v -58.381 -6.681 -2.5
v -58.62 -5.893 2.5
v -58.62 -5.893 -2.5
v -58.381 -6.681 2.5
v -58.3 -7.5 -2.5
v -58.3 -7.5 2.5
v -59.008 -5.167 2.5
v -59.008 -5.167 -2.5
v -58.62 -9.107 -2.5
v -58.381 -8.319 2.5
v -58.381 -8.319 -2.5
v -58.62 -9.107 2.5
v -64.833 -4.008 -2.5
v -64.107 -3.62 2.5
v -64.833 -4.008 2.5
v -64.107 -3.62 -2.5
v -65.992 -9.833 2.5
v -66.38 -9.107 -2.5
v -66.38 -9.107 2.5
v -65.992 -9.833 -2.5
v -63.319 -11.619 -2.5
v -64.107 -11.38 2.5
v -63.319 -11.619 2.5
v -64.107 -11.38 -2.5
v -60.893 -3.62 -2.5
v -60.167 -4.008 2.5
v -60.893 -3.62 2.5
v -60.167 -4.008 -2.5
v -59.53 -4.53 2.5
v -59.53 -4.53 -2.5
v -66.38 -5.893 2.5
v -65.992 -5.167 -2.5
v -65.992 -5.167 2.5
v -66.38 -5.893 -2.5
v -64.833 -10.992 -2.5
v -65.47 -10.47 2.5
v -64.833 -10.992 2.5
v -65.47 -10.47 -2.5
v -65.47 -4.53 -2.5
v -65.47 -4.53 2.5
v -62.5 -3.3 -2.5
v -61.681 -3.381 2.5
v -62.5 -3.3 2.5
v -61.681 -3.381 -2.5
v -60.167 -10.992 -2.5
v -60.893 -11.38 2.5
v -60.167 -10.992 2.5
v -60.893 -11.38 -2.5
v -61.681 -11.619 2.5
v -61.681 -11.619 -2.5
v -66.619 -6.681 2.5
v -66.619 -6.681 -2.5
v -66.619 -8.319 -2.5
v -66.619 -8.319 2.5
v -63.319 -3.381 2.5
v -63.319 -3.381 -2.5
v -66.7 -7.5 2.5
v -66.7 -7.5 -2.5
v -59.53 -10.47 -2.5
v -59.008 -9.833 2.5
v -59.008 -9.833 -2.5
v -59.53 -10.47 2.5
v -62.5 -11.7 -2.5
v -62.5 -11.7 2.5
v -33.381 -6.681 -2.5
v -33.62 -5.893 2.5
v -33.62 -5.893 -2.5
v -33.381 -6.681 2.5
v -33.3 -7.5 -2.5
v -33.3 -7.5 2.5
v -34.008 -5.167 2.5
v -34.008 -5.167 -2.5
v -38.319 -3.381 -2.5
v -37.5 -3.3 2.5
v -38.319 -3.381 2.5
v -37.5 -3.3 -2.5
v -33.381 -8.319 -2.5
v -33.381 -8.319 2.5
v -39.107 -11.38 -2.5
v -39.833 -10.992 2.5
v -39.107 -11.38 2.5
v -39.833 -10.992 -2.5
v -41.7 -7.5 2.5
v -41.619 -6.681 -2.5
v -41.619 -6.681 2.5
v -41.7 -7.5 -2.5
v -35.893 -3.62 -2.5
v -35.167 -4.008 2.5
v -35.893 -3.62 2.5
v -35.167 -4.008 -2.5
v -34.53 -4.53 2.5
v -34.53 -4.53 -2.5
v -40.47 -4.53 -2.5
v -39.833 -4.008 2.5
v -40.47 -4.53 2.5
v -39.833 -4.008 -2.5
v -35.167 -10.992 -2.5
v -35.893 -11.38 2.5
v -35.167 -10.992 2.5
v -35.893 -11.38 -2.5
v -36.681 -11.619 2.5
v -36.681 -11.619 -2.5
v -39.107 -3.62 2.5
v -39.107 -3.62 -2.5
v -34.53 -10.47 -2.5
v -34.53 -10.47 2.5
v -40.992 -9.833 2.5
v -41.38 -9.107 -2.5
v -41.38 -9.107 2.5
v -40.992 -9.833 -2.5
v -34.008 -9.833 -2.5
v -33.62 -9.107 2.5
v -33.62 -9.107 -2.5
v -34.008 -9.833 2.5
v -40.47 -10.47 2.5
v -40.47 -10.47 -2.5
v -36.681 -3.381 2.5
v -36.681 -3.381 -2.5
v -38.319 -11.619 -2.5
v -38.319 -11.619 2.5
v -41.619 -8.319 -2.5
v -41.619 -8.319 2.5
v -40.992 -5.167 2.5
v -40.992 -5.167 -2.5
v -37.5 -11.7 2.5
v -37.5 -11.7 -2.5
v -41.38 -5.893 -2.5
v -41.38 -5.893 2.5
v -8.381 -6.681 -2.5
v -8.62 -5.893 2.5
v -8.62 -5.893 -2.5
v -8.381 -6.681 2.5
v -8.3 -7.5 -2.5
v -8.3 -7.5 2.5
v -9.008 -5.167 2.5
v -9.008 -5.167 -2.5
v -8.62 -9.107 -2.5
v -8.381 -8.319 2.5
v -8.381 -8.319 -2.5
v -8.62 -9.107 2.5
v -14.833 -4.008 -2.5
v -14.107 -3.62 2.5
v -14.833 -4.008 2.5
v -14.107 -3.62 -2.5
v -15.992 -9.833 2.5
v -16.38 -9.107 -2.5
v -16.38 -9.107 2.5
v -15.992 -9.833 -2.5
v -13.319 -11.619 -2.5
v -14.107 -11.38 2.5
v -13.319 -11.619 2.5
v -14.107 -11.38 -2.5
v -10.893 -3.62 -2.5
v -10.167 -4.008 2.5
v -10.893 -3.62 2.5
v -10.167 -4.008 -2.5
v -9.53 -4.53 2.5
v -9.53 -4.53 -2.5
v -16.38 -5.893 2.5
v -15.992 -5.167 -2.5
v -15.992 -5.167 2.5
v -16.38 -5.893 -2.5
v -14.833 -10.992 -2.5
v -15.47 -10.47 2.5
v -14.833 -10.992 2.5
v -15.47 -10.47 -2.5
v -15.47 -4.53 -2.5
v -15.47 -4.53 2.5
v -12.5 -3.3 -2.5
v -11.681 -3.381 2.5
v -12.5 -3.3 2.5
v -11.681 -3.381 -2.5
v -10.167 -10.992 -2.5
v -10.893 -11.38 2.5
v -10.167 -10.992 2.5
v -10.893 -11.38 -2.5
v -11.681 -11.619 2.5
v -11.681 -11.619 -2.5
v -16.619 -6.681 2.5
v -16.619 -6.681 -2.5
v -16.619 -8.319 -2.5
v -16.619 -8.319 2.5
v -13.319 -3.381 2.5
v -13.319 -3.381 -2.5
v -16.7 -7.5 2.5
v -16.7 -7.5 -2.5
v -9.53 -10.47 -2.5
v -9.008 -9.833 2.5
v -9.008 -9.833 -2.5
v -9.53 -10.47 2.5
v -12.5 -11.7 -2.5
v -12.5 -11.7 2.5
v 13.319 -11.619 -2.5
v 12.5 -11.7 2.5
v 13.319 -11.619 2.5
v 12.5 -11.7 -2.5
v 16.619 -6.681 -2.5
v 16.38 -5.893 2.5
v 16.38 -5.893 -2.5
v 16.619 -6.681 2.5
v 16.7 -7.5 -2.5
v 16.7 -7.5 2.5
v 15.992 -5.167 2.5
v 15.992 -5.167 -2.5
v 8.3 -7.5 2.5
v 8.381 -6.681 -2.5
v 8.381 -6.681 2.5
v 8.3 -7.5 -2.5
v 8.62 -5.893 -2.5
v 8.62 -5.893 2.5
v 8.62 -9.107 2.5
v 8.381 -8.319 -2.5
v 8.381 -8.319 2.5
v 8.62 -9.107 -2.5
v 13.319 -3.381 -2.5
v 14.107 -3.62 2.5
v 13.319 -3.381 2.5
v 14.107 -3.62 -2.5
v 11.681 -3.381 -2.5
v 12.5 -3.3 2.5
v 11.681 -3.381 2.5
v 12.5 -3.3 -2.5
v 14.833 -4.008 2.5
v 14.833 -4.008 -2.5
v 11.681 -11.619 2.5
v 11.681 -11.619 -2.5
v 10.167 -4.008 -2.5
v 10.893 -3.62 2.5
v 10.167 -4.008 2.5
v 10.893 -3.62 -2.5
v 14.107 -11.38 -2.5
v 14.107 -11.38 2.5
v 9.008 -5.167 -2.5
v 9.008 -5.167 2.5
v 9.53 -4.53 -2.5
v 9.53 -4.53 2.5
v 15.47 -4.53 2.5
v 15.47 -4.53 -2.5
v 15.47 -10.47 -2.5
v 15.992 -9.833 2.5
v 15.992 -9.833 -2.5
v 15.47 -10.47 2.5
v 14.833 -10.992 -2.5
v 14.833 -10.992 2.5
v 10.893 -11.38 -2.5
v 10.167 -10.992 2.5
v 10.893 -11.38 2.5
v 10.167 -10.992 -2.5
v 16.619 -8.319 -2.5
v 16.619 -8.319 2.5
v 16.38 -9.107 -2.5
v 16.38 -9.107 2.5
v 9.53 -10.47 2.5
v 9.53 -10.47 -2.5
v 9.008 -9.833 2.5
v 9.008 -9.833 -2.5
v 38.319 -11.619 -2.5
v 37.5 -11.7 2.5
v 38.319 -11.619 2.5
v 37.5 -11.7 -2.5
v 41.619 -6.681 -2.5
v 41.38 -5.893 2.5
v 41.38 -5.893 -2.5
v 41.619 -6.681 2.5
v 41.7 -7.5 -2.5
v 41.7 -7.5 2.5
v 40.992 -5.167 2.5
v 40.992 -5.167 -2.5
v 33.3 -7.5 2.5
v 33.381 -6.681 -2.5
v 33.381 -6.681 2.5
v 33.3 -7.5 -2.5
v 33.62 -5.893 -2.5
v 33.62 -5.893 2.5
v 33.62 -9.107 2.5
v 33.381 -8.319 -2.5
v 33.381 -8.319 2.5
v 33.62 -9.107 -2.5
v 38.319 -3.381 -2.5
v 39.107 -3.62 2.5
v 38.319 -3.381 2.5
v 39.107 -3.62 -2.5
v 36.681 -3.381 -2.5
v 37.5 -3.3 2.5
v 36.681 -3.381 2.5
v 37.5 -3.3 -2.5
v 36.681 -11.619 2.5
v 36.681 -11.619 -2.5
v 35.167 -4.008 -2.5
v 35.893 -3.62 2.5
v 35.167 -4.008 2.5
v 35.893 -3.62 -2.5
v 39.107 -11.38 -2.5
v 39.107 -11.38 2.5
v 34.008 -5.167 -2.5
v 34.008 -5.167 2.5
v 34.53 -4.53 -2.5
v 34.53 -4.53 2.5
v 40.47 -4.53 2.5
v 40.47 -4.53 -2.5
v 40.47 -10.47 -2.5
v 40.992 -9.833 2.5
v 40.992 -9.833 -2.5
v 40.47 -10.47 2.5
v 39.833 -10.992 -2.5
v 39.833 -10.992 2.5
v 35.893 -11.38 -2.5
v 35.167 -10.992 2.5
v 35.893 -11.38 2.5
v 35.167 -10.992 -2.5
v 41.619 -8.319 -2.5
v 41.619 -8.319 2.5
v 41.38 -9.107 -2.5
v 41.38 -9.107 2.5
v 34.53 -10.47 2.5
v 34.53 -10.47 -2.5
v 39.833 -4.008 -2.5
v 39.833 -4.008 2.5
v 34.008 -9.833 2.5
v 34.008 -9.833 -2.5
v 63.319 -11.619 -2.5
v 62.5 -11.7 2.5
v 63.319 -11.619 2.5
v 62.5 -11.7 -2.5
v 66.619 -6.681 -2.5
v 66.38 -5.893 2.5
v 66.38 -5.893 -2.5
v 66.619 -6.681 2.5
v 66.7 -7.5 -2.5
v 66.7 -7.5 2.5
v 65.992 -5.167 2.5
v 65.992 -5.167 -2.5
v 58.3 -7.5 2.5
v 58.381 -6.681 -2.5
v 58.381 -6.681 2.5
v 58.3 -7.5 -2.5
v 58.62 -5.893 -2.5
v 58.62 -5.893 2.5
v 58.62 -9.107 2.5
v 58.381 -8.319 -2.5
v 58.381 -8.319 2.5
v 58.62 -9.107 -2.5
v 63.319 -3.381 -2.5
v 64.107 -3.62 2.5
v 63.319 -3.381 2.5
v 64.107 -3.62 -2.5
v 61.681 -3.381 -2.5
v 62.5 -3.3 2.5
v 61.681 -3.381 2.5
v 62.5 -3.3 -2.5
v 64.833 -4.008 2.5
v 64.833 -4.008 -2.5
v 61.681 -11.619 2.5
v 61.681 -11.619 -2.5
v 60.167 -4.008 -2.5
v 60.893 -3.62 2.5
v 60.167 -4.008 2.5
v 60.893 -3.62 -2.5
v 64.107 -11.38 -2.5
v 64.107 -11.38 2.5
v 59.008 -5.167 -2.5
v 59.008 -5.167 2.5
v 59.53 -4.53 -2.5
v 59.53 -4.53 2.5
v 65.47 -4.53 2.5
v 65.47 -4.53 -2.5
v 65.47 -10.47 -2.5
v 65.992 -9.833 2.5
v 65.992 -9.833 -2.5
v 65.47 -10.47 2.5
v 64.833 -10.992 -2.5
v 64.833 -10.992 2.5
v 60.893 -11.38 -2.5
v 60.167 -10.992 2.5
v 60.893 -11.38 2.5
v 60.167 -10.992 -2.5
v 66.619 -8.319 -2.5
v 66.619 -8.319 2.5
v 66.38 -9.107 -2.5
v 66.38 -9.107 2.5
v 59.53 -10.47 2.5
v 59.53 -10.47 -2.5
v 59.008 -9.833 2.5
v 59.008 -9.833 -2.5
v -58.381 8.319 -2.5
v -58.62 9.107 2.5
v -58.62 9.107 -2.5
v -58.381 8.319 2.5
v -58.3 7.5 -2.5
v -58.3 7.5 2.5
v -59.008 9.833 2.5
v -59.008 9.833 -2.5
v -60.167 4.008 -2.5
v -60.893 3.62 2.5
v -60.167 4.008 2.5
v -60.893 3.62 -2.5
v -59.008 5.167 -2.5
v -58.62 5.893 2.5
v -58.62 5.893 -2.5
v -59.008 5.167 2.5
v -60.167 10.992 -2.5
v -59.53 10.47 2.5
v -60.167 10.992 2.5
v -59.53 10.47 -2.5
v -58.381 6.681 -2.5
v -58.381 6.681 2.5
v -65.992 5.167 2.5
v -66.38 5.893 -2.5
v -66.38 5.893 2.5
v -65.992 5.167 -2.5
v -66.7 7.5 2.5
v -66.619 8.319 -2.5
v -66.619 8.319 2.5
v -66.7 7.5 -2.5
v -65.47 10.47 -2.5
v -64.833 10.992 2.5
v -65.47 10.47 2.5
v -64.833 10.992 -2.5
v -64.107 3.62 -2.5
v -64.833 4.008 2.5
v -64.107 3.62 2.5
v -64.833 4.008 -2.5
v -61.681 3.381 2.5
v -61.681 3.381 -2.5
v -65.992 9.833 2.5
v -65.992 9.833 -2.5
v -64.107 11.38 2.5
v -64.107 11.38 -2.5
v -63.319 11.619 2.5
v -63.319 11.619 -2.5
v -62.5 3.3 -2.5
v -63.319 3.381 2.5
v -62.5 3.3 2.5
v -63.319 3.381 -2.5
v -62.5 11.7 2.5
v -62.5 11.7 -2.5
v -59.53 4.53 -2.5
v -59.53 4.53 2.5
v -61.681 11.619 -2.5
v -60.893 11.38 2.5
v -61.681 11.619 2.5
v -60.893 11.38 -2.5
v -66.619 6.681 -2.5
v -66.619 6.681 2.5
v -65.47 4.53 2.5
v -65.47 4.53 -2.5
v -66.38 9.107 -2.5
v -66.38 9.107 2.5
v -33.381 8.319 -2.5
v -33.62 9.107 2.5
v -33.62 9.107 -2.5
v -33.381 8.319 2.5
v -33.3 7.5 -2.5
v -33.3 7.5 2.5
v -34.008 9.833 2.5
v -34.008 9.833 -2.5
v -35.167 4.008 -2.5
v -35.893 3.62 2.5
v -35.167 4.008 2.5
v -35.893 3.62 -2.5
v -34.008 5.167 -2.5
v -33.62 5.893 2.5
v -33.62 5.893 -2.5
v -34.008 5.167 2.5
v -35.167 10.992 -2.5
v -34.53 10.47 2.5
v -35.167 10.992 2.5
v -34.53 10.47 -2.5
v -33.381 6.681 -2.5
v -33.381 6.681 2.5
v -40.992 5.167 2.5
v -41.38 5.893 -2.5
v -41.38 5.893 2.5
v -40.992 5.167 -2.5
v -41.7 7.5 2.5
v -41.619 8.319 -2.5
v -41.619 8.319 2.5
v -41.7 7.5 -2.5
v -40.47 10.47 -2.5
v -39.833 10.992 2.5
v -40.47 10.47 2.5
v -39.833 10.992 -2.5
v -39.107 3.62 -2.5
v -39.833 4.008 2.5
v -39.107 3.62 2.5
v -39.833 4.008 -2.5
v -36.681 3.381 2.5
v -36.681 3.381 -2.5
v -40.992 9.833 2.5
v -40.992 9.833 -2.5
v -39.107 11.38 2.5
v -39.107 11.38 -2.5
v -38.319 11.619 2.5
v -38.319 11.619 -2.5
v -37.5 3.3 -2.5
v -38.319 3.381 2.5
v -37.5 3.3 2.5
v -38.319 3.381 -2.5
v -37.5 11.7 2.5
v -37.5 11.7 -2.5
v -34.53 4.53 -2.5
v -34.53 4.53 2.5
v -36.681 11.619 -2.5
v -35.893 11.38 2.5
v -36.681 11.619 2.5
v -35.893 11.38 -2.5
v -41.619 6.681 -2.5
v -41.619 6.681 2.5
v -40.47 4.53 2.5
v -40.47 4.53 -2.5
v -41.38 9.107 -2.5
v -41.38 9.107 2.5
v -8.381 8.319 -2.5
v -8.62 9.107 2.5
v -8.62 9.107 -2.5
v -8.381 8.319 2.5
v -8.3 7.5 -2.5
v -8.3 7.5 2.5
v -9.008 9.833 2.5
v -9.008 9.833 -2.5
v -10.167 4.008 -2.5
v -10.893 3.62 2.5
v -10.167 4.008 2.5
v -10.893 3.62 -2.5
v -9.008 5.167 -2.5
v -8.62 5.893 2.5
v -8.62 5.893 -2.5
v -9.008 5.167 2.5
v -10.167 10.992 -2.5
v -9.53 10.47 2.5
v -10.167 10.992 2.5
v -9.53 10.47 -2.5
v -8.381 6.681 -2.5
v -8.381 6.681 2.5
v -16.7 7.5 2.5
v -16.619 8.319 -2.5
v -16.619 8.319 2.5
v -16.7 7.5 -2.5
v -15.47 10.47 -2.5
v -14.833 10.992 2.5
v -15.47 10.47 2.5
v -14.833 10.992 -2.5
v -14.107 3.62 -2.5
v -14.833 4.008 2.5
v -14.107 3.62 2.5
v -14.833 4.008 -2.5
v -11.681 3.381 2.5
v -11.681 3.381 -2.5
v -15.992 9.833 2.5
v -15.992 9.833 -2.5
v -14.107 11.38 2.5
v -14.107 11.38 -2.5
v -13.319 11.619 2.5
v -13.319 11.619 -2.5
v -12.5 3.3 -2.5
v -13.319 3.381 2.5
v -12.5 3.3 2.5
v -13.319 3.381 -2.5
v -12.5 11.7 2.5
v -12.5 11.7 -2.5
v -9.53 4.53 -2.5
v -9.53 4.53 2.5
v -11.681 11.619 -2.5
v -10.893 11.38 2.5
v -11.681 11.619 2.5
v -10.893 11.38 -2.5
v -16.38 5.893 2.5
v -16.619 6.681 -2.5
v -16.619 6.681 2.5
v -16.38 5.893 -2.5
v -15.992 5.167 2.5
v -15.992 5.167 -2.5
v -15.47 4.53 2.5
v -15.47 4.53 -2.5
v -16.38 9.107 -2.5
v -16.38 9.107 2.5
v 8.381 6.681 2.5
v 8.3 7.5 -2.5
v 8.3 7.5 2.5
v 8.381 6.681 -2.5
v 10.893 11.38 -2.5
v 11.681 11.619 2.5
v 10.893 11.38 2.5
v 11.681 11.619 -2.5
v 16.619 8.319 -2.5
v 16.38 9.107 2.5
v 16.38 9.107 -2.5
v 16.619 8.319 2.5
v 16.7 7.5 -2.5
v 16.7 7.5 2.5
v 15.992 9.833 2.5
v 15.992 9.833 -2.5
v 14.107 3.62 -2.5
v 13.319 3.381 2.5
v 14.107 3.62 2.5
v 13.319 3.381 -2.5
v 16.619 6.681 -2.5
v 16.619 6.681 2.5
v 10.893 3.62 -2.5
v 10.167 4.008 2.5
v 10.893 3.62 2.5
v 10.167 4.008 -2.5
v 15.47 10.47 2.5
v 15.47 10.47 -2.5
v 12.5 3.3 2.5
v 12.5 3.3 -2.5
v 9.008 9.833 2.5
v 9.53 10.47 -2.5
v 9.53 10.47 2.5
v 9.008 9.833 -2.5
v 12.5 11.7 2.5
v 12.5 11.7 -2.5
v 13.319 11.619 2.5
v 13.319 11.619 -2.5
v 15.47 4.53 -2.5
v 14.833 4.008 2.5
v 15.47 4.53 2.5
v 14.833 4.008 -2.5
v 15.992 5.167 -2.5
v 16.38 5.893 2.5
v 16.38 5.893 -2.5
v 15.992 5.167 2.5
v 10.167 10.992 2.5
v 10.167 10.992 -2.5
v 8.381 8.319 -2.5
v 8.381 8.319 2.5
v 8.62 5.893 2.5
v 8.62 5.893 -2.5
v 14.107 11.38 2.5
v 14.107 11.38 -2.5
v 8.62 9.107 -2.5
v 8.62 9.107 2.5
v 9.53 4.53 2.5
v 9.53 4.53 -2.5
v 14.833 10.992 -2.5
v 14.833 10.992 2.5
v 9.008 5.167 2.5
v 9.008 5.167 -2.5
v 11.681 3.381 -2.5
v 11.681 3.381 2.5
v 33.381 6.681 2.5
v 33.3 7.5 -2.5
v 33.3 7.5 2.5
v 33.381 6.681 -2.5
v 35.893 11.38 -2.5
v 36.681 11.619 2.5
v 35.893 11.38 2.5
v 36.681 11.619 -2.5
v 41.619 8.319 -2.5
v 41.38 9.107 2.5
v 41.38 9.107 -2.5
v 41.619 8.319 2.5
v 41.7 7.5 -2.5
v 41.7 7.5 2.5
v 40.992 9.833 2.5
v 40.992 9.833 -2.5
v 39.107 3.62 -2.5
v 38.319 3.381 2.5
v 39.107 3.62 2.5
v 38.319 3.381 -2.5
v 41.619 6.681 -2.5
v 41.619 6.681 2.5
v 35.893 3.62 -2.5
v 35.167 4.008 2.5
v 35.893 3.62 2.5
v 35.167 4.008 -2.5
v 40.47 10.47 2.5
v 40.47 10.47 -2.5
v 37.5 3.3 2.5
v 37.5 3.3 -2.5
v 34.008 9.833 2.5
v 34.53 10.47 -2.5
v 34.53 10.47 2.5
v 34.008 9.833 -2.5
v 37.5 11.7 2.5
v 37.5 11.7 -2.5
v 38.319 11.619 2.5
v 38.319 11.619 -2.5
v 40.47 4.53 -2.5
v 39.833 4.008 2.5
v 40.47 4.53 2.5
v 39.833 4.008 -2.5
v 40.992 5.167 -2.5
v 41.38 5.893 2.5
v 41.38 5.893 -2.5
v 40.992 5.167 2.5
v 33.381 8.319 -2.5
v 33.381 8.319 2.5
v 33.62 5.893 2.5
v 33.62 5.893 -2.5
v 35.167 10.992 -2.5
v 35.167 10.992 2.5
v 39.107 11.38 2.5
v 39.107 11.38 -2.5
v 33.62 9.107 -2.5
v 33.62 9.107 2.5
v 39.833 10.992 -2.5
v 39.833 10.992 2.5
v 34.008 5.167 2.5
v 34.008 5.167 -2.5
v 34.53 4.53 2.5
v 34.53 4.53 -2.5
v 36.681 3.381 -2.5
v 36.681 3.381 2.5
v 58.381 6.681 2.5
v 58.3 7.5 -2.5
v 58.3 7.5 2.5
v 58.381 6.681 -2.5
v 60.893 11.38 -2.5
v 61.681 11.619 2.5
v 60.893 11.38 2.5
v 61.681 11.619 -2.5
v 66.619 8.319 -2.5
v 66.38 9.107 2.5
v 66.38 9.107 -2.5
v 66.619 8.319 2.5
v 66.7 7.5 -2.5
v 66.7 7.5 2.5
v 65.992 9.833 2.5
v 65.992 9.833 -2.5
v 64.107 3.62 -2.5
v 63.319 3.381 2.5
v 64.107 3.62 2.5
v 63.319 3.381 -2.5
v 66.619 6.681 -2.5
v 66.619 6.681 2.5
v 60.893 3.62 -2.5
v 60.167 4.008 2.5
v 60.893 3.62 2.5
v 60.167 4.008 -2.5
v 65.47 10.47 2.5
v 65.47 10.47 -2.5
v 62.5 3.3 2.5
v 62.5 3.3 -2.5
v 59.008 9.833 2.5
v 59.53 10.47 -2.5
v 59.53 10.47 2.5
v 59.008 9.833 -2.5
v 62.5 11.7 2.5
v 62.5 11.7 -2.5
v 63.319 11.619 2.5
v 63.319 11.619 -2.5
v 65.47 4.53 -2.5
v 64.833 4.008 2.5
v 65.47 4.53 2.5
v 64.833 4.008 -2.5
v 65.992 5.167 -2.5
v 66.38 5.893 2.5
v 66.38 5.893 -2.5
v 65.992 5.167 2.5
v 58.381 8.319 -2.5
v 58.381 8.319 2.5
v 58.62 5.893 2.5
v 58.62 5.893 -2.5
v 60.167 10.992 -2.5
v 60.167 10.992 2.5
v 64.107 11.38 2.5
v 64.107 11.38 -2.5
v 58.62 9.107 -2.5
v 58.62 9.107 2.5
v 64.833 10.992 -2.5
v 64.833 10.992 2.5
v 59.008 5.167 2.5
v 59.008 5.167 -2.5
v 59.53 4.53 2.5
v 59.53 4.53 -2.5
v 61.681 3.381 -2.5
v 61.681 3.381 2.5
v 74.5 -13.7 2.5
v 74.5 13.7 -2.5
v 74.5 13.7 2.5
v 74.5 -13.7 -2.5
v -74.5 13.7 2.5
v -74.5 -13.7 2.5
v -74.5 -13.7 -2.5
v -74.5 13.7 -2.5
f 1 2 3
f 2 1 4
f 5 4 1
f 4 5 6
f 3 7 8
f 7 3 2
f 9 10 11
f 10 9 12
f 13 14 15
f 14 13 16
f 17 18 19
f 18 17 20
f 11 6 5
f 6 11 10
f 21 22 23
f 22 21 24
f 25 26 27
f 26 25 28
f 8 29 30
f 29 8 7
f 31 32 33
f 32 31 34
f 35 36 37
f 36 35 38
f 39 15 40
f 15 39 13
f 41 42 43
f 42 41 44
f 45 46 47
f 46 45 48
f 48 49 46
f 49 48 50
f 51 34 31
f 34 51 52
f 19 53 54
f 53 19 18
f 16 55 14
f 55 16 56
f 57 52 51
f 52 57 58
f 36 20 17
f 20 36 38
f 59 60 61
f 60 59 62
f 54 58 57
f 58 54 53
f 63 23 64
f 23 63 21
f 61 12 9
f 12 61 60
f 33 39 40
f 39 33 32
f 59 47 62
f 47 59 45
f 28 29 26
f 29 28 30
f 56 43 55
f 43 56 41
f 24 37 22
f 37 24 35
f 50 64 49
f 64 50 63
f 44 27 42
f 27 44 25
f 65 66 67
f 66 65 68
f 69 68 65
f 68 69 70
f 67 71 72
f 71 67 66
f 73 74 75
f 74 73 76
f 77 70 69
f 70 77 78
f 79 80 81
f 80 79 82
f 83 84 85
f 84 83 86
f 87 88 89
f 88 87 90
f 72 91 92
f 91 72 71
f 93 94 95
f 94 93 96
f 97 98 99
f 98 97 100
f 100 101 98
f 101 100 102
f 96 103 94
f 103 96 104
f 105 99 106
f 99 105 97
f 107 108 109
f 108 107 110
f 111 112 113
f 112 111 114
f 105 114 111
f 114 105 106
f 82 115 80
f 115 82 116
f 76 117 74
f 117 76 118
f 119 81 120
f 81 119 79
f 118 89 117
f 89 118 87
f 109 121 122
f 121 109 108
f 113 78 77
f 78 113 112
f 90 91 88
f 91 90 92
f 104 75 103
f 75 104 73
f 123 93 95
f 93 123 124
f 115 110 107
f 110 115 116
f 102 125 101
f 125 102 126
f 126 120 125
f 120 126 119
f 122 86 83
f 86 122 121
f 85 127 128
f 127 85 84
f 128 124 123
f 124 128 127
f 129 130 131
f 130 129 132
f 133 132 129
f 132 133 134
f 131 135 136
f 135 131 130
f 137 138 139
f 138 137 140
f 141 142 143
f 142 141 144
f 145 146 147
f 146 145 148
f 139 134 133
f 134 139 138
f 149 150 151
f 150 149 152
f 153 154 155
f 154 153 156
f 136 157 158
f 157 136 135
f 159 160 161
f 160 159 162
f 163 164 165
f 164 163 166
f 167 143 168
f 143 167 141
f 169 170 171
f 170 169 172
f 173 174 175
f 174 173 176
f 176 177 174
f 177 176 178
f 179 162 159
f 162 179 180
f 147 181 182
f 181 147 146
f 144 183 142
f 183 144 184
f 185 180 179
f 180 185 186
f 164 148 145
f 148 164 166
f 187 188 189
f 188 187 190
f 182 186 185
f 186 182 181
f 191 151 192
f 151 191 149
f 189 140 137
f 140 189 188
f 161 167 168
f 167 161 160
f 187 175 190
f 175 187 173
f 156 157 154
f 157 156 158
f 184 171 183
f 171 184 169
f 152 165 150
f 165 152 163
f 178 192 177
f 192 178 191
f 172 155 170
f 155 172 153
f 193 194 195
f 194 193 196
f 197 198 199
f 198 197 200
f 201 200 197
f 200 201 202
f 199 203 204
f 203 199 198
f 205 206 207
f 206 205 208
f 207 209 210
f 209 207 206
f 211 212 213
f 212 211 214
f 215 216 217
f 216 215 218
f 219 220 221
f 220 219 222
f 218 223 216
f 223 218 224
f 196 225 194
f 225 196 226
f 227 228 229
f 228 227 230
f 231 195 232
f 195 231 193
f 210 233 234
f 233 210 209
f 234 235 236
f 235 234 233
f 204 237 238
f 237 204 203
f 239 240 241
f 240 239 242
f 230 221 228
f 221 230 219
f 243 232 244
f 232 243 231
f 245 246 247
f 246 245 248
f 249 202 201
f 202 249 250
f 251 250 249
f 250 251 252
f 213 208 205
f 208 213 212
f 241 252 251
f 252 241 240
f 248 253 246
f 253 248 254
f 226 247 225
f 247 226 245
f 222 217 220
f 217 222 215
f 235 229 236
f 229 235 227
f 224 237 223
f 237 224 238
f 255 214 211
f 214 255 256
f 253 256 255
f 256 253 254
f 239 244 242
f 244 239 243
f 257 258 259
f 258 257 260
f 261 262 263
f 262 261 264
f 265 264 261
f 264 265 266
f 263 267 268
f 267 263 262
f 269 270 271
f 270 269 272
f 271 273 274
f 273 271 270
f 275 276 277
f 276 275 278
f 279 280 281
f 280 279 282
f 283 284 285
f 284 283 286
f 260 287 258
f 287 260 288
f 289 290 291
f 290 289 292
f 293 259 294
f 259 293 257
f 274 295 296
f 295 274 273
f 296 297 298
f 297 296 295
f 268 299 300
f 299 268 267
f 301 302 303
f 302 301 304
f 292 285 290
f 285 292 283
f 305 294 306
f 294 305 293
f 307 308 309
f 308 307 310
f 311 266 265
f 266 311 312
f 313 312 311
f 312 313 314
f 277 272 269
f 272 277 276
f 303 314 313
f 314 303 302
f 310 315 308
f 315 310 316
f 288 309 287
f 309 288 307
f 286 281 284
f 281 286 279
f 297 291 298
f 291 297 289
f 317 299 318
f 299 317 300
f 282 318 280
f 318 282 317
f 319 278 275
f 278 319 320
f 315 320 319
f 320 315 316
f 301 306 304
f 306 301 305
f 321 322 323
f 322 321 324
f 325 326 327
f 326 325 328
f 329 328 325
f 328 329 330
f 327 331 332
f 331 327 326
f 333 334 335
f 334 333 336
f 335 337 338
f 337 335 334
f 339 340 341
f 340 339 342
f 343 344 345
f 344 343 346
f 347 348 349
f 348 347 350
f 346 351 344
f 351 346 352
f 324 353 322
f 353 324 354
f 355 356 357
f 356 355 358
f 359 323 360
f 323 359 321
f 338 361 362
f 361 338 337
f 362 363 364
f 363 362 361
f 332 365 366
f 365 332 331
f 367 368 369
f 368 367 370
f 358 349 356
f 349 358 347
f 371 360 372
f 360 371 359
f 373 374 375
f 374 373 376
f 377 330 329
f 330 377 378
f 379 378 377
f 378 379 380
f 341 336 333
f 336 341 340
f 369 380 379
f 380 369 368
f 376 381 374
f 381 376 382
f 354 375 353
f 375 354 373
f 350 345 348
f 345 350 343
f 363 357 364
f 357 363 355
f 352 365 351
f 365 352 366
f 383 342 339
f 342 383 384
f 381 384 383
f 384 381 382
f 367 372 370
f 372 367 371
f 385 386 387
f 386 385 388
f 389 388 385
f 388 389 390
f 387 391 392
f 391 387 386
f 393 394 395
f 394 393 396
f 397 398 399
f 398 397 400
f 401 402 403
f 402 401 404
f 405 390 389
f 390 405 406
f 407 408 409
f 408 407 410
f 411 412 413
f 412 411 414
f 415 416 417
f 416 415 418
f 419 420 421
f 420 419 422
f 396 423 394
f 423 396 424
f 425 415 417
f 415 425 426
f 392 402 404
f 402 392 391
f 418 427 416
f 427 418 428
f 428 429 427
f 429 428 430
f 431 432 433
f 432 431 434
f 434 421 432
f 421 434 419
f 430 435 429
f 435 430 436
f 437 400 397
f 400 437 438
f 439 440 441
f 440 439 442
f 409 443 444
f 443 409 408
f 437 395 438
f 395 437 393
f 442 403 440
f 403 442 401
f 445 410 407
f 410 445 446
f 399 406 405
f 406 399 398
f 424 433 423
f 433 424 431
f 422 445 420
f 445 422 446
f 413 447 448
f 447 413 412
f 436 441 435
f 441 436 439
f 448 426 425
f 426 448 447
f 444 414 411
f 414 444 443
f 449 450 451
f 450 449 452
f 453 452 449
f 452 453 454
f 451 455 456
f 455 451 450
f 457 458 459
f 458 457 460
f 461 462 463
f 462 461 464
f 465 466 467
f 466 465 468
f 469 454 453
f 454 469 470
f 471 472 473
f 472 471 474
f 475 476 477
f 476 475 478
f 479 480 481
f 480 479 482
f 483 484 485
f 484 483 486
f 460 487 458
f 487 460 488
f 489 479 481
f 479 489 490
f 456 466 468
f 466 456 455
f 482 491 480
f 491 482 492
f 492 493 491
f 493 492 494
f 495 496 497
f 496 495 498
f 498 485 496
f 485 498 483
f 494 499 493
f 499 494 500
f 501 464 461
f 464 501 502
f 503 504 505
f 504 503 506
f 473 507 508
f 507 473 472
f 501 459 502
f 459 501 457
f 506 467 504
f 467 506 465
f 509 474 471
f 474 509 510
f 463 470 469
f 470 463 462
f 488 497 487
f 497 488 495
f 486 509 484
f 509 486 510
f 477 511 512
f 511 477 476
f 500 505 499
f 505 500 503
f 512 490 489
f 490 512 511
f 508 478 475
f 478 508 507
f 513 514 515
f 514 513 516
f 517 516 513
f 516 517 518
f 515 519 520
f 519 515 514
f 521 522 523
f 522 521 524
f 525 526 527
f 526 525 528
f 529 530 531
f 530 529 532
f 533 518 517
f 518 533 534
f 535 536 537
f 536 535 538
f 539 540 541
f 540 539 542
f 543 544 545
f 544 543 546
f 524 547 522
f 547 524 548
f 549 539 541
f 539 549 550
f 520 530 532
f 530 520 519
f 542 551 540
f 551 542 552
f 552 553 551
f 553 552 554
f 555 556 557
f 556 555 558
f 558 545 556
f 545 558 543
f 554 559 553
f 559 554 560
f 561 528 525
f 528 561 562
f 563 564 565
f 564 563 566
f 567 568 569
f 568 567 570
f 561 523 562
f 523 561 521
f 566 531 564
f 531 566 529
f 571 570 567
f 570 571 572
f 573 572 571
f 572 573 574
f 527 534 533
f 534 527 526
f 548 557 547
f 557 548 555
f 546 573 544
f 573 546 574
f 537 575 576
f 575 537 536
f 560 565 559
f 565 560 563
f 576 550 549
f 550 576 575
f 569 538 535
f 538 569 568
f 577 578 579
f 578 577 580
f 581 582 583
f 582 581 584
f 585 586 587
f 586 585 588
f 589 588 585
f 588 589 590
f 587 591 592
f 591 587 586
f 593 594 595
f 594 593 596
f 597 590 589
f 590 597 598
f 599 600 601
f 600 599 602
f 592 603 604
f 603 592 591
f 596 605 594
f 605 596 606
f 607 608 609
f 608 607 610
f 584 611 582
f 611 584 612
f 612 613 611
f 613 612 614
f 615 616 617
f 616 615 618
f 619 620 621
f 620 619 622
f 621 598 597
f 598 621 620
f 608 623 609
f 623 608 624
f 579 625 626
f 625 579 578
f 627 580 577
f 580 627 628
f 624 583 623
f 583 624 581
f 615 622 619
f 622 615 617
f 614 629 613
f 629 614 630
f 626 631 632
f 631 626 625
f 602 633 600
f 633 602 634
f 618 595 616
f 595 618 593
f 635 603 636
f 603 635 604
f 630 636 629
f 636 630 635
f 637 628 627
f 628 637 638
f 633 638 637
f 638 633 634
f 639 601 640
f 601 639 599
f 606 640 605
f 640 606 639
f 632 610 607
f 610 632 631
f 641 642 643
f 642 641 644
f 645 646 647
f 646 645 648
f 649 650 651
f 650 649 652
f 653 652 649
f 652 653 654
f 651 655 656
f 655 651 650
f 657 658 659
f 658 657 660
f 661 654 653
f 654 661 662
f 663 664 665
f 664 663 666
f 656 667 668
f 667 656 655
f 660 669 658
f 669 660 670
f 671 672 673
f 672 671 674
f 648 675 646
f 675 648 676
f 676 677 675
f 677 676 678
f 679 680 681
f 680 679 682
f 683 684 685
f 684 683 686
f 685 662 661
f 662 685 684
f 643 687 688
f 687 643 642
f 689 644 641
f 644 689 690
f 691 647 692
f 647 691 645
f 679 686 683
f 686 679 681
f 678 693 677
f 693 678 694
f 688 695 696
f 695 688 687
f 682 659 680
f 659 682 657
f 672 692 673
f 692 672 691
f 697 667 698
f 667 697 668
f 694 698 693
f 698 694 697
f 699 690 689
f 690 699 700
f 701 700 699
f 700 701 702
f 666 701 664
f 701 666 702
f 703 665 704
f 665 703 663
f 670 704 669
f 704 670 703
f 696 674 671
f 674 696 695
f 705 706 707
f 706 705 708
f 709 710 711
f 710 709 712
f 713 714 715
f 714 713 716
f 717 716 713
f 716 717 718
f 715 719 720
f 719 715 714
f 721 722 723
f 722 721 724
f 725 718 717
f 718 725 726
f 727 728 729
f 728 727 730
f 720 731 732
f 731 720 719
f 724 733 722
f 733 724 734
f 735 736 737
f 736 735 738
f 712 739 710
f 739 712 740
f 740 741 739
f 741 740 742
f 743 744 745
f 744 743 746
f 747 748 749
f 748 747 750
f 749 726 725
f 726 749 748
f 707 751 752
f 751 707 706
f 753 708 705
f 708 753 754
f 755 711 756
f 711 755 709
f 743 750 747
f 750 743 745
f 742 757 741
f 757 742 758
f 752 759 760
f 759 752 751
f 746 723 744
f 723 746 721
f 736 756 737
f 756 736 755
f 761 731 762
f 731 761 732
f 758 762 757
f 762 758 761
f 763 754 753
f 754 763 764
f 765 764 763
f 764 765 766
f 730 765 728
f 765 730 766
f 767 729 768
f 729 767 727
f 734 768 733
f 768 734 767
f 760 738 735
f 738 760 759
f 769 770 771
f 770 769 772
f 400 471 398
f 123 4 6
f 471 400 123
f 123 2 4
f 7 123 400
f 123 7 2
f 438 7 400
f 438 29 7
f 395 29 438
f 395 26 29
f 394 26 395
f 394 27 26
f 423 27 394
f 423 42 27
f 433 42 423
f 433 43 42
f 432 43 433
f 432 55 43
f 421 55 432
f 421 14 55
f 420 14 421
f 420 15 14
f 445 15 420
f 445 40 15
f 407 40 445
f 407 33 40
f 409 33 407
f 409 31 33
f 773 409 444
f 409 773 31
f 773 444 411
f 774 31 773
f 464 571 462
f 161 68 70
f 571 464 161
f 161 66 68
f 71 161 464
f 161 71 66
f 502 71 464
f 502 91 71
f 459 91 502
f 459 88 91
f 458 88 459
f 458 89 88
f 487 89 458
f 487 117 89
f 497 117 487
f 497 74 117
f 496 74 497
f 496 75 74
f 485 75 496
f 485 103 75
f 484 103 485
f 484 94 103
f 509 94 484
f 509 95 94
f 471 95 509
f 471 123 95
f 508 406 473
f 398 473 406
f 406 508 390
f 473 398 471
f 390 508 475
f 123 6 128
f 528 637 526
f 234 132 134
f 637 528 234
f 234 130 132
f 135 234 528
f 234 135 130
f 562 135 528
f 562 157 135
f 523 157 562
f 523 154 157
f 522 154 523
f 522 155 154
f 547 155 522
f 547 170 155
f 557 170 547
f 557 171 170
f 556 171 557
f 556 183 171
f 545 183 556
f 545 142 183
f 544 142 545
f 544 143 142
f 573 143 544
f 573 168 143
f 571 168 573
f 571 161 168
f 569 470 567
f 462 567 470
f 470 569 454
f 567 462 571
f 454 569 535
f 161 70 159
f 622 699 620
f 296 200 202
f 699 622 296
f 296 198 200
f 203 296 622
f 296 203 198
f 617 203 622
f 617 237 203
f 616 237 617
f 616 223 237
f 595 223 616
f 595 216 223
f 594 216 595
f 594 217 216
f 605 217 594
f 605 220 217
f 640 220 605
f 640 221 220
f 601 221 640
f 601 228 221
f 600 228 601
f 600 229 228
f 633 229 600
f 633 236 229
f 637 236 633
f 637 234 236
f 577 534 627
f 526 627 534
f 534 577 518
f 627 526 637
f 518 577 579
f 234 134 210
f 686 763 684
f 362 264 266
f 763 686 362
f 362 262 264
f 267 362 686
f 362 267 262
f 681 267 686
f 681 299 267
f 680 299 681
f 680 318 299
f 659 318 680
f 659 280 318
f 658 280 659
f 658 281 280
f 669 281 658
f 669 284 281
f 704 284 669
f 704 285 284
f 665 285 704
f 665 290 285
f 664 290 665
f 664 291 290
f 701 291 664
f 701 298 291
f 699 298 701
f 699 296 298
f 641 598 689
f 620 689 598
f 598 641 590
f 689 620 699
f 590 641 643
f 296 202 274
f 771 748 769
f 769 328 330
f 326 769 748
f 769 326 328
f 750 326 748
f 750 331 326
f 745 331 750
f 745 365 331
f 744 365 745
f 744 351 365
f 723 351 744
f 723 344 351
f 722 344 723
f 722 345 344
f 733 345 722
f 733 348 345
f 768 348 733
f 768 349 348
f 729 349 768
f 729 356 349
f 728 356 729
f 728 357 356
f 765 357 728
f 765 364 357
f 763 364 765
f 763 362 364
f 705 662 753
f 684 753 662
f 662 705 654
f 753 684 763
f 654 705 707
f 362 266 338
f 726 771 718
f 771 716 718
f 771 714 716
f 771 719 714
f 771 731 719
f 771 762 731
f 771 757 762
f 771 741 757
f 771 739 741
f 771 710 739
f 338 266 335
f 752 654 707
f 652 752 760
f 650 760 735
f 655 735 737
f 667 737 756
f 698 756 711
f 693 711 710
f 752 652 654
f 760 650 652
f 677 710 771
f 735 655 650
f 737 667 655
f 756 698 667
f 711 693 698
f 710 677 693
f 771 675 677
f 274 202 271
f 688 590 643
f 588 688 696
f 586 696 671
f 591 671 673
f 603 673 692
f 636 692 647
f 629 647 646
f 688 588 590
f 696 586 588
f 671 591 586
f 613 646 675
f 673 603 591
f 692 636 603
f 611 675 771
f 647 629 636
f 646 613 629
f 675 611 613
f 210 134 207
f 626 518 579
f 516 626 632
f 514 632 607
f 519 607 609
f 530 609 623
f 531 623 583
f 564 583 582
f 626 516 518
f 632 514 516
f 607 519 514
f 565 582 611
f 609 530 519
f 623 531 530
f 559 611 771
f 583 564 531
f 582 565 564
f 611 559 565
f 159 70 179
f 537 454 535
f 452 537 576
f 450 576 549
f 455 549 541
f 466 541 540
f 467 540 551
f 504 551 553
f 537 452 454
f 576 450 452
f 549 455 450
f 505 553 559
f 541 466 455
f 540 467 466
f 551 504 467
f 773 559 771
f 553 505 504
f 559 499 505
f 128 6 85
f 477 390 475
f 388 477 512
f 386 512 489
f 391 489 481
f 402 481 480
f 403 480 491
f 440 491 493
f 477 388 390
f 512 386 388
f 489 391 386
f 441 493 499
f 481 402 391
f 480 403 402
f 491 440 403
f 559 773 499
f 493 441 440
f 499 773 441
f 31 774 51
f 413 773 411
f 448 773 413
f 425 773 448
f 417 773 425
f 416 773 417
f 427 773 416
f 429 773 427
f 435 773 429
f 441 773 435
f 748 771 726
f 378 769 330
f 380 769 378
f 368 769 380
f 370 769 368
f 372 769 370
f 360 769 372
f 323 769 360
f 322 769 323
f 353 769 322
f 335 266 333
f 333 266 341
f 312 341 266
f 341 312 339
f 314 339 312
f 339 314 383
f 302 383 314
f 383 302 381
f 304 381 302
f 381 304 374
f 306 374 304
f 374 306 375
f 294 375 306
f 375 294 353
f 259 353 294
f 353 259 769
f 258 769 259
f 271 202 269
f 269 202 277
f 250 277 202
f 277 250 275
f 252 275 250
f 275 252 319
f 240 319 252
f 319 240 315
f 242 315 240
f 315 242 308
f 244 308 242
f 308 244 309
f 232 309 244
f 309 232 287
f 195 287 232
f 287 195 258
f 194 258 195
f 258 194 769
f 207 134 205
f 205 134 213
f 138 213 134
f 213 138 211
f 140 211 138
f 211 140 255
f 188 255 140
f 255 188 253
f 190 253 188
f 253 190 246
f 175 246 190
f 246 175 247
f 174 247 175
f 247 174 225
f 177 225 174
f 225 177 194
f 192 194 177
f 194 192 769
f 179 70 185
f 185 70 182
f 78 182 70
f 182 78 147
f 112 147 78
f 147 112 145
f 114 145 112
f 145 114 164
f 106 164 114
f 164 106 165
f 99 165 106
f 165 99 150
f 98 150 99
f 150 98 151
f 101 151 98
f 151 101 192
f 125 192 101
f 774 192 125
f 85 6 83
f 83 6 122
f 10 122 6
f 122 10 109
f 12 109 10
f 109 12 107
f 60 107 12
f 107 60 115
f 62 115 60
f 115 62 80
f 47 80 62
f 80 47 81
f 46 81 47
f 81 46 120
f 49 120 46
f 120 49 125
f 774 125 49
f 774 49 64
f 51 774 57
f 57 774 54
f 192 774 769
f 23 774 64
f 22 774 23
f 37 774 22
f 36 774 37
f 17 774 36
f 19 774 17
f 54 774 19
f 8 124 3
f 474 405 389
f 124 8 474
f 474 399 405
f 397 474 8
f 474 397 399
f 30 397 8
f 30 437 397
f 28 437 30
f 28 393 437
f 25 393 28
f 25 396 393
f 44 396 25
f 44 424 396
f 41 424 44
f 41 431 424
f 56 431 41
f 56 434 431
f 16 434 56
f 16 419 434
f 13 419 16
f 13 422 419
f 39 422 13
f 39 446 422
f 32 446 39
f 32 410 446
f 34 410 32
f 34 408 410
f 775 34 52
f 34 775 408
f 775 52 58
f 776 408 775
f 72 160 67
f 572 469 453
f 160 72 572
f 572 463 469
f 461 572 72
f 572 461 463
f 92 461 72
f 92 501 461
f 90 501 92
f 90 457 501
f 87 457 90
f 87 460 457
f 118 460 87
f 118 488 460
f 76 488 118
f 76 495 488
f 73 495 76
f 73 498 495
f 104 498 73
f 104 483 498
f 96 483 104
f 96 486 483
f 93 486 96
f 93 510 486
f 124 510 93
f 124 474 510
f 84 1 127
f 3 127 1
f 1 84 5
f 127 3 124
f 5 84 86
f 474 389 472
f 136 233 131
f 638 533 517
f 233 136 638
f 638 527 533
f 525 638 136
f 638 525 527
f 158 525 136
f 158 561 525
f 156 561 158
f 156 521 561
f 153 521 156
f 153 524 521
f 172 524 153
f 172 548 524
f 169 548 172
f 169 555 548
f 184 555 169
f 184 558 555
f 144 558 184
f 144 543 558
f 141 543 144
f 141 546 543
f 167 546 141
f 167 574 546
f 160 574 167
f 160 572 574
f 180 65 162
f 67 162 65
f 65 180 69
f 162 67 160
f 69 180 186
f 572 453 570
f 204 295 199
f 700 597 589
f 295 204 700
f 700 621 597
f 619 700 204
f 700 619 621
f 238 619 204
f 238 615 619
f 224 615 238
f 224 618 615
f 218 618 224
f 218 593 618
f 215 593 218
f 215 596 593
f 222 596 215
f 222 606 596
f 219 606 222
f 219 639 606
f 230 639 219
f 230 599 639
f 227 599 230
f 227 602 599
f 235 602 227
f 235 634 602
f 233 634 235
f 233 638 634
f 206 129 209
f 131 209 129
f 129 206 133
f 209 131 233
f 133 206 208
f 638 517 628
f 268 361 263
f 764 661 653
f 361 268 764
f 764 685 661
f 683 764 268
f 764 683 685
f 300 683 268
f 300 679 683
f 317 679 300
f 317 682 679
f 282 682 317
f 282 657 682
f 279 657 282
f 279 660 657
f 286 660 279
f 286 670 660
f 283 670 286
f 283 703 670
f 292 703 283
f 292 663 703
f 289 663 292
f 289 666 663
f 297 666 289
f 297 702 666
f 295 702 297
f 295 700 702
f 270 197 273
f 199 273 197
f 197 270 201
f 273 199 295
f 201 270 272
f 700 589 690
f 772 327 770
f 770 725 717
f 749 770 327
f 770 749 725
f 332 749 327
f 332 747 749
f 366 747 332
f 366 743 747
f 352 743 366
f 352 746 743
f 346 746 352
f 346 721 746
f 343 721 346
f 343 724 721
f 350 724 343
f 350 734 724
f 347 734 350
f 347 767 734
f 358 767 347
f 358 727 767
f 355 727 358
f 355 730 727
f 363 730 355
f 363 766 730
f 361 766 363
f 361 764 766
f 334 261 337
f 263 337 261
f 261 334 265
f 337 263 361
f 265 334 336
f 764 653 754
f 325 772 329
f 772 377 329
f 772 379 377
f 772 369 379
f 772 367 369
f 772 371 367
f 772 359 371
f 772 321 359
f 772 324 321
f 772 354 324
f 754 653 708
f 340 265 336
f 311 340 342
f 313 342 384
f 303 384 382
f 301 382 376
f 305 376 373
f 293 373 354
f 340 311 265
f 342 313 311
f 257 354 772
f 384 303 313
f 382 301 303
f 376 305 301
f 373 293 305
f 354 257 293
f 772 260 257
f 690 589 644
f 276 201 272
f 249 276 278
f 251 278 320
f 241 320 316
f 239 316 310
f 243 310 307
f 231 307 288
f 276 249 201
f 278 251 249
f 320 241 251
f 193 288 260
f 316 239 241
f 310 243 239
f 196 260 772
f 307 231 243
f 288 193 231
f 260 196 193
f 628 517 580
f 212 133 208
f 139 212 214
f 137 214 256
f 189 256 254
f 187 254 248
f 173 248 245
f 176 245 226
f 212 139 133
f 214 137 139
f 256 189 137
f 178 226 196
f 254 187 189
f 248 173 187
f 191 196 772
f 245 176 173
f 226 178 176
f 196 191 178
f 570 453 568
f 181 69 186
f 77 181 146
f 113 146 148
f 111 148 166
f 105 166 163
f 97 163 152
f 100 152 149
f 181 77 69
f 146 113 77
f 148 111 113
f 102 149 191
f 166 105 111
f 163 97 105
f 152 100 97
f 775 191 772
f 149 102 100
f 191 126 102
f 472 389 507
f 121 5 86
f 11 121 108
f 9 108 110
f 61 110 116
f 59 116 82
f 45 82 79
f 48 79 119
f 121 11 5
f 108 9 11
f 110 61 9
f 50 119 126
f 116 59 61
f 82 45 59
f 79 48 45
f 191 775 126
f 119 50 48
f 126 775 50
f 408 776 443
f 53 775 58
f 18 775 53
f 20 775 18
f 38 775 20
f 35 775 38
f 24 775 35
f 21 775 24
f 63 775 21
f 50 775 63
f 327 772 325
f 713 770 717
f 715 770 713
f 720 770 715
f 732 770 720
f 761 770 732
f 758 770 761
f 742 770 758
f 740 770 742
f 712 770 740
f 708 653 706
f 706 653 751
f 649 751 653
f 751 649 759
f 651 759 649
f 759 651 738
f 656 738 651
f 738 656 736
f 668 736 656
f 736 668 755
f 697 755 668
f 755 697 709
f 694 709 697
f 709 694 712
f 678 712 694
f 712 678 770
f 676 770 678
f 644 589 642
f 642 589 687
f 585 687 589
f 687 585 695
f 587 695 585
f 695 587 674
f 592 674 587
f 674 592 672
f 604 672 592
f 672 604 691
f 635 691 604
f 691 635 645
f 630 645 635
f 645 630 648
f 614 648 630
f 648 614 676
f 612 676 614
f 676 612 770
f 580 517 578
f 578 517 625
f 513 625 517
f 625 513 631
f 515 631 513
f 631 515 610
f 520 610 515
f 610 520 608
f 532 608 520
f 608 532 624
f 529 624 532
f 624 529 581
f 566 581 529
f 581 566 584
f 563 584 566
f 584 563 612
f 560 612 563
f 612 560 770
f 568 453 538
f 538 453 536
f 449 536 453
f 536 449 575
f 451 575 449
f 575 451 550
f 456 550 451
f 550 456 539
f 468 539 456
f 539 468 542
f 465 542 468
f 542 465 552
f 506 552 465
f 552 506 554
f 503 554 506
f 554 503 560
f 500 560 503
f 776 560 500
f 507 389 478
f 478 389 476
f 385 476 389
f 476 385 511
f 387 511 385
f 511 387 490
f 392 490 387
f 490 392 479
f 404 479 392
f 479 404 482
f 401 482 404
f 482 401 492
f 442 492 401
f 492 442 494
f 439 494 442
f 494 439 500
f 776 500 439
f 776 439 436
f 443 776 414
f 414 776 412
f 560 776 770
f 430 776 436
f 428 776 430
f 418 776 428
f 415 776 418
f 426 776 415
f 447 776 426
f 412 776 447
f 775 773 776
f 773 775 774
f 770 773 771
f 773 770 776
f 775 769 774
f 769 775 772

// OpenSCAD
$fn = 32;

// ----------------------------------------------------------------------
// Hole bar, 6 x Ø8.4
// tworows layout, 12 mm edge offset
// ----------------------------------------------------------------------

// --- parameters (mm) ---
bar_w = 27.4;     // bar width (Y)
bar_t = 5;        // bar thickness (Z)
holes = 6;        // holes per row
hole_d = 8.4;     // hole diameter
edge = 12;        // offset from the bar end to the first hole
pitch = 25;       // pitch between neighbouring holes
row_offset = 15;  // distance between the two rows

// --- derived feature positions (mm) ---
span = (holes - 1) * pitch;   // = 125   distance between the end holes
bar_l = span + 2 * edge;      // = 149   overall bar length
start_x = -bar_l / 2 + edge;  // = -62.5   X of the first hole
feature_centers = [
  [start_x + 0 * pitch, -row_offset / 2],
  [start_x + 1 * pitch, -row_offset / 2],
  [start_x + 2 * pitch, -row_offset / 2],
  [start_x + 3 * pitch, -row_offset / 2],
  [start_x + 4 * pitch, -row_offset / 2],
  [start_x + 5 * pitch, -row_offset / 2]
];   // hole centres of the first row
row2_centers = [
  [start_x + 0 * pitch, row_offset / 2],
  [start_x + 1 * pitch, row_offset / 2],
  [start_x + 2 * pitch, row_offset / 2],
  [start_x + 3 * pitch, row_offset / 2],
  [start_x + 4 * pitch, row_offset / 2],
  [start_x + 5 * pitch, row_offset / 2]
];   // hole centres of the second row

// bar with two rows of holes, both read from their own centre arrays
difference() {
  translate([-bar_l / 2, -bar_w / 2, -bar_t / 2]) cube([bar_l, bar_w, bar_t]);
  for (centre = feature_centers)
    translate([centre[0], centre[1], 0])
      cylinder(d = hole_d, h = bar_t + 2, center = true);
  for (centre = row2_centers)
    translate([centre[0], centre[1], 0])
      cylinder(d = hole_d, h = bar_t + 2, center = true);
}
